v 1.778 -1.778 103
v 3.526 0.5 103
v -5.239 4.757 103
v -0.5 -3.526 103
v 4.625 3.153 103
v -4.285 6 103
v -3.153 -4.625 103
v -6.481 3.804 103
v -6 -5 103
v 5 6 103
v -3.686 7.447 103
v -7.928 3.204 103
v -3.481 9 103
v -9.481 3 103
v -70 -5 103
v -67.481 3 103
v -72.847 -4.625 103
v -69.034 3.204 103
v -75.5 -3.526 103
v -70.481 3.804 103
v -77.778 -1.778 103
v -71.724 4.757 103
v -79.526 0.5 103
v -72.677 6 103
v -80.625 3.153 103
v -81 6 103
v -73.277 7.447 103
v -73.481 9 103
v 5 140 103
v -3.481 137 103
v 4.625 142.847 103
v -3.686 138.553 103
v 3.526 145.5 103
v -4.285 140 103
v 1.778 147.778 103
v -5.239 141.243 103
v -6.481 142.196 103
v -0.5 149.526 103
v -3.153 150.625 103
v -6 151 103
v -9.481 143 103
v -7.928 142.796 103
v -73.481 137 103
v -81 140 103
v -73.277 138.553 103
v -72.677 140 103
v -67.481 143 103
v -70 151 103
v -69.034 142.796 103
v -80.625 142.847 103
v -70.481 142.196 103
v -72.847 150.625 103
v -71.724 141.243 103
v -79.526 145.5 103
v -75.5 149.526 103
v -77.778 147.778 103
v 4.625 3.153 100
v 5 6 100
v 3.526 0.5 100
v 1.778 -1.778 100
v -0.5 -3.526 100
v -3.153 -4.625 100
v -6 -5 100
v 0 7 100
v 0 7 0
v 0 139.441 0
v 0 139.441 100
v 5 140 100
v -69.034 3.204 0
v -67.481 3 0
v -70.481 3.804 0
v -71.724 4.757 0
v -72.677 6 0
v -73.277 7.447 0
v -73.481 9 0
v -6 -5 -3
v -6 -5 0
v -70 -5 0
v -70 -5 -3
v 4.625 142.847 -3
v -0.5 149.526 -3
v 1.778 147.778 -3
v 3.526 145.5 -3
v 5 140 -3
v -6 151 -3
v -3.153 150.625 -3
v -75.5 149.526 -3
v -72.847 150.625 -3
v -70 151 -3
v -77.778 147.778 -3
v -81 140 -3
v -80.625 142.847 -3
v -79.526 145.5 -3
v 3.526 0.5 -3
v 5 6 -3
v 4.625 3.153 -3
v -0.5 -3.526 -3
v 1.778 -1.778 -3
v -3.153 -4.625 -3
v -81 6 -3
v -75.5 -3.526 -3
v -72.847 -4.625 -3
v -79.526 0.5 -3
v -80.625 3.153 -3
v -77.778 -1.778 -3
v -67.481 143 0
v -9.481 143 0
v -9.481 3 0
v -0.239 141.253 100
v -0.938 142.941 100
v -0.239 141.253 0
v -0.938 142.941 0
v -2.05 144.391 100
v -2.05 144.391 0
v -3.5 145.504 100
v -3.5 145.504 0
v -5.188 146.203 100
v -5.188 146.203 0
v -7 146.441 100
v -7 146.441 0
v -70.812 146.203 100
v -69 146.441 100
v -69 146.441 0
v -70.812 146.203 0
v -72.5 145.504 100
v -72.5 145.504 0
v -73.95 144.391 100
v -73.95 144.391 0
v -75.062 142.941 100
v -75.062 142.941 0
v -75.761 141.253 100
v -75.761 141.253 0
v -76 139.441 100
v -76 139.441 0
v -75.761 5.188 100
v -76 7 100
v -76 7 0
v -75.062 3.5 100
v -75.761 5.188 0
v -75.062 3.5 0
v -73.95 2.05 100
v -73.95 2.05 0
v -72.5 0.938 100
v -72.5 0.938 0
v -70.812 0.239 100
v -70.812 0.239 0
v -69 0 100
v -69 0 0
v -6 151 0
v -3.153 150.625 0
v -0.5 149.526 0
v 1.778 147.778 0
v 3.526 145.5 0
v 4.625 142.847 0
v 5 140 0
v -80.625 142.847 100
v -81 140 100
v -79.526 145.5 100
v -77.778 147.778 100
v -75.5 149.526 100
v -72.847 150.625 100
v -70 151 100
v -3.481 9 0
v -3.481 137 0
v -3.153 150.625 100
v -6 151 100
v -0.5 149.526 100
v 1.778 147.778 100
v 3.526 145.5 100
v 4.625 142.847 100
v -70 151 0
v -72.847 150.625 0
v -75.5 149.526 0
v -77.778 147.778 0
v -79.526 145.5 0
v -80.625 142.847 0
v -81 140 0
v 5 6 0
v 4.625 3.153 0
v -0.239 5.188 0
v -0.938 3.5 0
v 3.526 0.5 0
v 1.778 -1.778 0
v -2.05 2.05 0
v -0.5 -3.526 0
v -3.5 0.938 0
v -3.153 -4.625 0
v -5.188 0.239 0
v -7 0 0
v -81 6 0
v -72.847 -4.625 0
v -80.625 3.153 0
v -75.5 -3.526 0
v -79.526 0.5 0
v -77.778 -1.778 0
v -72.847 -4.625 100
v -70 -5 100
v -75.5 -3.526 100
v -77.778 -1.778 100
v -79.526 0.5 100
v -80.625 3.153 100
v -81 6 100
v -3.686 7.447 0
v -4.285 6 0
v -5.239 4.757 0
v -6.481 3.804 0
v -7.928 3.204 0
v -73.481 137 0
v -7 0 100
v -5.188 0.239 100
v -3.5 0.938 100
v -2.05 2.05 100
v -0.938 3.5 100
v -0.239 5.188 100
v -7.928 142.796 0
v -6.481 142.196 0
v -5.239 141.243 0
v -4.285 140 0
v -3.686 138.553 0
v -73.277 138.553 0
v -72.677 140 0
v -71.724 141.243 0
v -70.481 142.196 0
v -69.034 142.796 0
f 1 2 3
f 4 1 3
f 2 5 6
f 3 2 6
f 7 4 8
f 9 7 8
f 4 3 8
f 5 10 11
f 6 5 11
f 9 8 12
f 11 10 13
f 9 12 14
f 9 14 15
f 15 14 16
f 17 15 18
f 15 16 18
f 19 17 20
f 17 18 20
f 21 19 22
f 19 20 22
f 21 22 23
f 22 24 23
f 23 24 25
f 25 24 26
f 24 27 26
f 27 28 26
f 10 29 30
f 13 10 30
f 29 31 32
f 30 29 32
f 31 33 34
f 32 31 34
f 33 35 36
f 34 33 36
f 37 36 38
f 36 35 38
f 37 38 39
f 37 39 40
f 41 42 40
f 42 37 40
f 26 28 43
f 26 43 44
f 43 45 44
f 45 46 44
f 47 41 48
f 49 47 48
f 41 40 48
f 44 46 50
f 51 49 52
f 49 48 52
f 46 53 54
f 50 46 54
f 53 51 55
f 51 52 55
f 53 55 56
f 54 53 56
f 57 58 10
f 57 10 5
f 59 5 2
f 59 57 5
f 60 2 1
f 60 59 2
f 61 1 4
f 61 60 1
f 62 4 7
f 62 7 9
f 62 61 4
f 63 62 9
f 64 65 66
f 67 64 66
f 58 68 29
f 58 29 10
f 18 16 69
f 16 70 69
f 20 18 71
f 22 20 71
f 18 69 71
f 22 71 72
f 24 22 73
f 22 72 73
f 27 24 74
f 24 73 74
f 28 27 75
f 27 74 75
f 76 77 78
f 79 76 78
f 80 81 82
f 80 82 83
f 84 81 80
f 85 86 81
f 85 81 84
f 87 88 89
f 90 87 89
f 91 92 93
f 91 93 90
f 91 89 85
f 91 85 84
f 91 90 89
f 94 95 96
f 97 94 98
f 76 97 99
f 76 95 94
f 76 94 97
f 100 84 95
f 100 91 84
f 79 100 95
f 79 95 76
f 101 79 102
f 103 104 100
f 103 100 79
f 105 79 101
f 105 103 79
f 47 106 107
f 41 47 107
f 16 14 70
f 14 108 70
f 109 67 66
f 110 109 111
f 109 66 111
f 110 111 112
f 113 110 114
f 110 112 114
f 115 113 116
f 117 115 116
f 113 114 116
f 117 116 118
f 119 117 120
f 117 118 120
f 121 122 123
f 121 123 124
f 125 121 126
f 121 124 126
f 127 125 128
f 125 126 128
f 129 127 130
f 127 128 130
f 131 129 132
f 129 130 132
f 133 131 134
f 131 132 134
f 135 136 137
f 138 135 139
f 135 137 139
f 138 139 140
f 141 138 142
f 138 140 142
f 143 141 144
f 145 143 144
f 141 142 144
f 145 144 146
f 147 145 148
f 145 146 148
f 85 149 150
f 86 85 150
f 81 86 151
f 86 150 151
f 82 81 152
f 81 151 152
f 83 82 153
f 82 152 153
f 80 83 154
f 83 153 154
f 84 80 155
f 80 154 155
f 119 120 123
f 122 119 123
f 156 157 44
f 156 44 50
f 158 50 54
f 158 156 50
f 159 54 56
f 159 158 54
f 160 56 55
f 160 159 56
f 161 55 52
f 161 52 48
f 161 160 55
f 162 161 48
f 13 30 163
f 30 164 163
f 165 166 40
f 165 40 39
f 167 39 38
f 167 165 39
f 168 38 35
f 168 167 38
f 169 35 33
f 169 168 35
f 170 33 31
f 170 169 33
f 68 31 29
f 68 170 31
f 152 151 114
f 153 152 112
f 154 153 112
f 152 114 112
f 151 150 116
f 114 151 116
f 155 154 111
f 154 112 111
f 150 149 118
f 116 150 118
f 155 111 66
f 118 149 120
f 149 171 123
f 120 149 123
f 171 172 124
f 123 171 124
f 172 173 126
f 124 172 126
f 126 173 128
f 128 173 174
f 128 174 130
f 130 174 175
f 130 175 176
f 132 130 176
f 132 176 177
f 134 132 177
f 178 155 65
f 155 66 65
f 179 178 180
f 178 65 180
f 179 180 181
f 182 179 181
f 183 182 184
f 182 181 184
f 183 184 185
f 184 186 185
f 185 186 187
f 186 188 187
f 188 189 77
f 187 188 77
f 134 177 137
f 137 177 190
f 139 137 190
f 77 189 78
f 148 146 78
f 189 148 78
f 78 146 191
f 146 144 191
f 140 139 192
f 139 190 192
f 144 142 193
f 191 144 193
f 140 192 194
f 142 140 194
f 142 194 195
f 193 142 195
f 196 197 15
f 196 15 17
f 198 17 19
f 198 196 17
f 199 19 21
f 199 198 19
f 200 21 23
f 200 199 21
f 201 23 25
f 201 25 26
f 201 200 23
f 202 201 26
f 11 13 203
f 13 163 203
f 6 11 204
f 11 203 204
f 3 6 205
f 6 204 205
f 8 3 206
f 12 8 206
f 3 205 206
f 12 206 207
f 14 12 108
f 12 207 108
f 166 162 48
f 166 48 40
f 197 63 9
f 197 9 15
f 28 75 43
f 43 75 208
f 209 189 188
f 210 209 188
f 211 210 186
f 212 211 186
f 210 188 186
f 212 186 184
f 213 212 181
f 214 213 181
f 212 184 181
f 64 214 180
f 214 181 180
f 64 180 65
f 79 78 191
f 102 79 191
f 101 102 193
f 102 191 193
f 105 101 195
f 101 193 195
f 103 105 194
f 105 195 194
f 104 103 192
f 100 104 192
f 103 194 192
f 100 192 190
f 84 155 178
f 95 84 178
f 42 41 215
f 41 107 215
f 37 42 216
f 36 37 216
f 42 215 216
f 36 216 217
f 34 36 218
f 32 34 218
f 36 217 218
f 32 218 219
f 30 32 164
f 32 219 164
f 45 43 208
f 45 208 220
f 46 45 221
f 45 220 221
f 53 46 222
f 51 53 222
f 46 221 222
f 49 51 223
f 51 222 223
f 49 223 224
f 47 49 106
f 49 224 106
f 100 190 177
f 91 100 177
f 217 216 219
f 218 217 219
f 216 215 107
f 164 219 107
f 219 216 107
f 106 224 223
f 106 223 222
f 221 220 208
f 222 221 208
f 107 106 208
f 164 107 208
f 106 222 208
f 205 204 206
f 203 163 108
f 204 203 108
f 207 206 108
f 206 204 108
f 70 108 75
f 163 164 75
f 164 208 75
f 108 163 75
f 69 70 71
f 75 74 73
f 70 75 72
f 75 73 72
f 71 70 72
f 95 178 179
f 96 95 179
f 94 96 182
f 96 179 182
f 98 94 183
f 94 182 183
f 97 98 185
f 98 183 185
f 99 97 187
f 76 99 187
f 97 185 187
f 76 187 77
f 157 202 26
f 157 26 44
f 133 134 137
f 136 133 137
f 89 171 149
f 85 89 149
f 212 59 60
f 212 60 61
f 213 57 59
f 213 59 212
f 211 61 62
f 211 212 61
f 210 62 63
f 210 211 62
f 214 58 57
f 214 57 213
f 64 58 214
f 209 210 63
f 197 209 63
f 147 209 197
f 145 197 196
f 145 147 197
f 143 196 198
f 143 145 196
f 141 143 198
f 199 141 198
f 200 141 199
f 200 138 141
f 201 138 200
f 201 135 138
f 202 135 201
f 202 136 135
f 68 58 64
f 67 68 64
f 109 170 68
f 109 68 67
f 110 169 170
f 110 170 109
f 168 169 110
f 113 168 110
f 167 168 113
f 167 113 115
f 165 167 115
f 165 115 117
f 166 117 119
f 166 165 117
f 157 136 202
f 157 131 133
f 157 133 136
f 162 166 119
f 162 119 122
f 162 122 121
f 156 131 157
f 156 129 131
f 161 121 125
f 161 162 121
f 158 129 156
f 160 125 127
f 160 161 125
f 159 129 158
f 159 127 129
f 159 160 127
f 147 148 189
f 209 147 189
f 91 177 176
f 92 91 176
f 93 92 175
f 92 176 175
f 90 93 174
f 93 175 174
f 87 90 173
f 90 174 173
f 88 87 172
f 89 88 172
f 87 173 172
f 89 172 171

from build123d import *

# Parameters (mm, degrees)
BOSS_EXTRUDE3_DEPTH = 100
BOSS_EXTRUDE4_DEPTH = 3
BOSS_EXTRUDE5_DEPTH = 3


with BuildPart() as part:
    # Sketch1 → Boss-Extrude3 (new body)
    with BuildSketch(Plane(origin=(0, 0, 0), x_dir=(0, 1, 0), z_dir=(0, 0, 1))):
        with BuildLine():
            Line((7, 0), (139.441461344, 0))
            ThreePointArc((139.441461344, 0), (144.391208812, 2.050252532), (146.441461344, 7))
            Line((146.441461344, 7), (146.441461344, 69))
            ThreePointArc((146.441461344, 69), (144.391208812, 73.949747468), (139.441461344, 76))
            Line((139.441461344, 76), (7, 76))
            ThreePointArc((7, 76), (2.050252532, 73.949747468), (0, 69))
            Line((0, 69), (0, 7))
            ThreePointArc((0, 7), (2.050252532, 2.050252532), (7, 0))
        make_face()
        with BuildLine():
            Line((3, 38), (3, 67.481223709))
            ThreePointArc((3, 67.481223709), (4.757359313, 71.723864396), (9, 73.481223709))
            Line((9, 73.481223709), (137, 73.481223709))
            ThreePointArc((137, 73.481223709), (141.242640687, 71.723864396), (143, 67.481223709))
            Line((143, 67.481223709), (143, 9.481223709))
            ThreePointArc((143, 9.481223709), (141.242640687, 5.238583022), (137, 3.481223709))
            Line((137, 3.481223709), (9, 3.481223709))
            ThreePointArc((9, 3.481223709), (4.757359313, 5.238583022), (3, 9.481223709))
            Line((3, 9.481223709), (3, 38))
        make_face(mode=Mode.SUBTRACT)
    extrude(amount=BOSS_EXTRUDE3_DEPTH)

    # Sketch1<5> → Boss-Extrude4 (add)
    with BuildSketch(Plane(origin=(0, 0, 0), x_dir=(0, 1, 0), z_dir=(0, 0, 1))):
        with BuildLine():
            Line((151, 38), (151, 6))
            ThreePointArc((151, 6), (147.778174593, -1.778174593), (140, -5))
            Line((140, -5), (6, -5))
            ThreePointArc((6, -5), (-1.778174593, -1.778174593), (-5, 6))
            Line((-5, 6), (-5, 70))
            ThreePointArc((-5, 70), (-1.778174593, 77.778174593), (6, 81))
            Line((6, 81), (73.220730672, 81))
            Line((73.220730672, 81), (140, 81))
            ThreePointArc((140, 81), (147.778174593, 77.778174593), (151, 70))
            Line((151, 70), (151, 38))
        make_face()
    extrude(amount=-BOSS_EXTRUDE4_DEPTH)

    # Sketch2 → Boss-Extrude5 (add)
    with BuildSketch(Plane.XY.offset(100)):
        with BuildLine():
            Line((-70, 151), (-6, 151))
            ThreePointArc((-6, 151), (1.778174593, 147.778174593), (5, 140))
            Line((5, 140), (5, 6))
            ThreePointArc((5, 6), (1.778174593, -1.778174593), (-6, -5))
            Line((-6, -5), (-70, -5))
            ThreePointArc((-70, -5), (-77.778174593, -1.778174593), (-81, 6))
            Line((-81, 6), (-81, 140))
            ThreePointArc((-81, 140), (-77.778174593, 147.778174593), (-70, 151))
        make_face()
        with BuildLine():
            Line((-67.481223709, 143), (-9.481223709, 143))
            ThreePointArc((-9.481223709, 143), (-5.238583022, 141.242640687), (-3.481223709, 137))
            Line((-3.481223709, 137), (-3.481223709, 9))
            ThreePointArc((-3.481223709, 9), (-5.238583022, 4.757359313), (-9.481223709, 3))
            Line((-9.481223709, 3), (-67.481223709, 3))
            ThreePointArc((-67.481223709, 3), (-71.723864396, 4.757359313), (-73.481223709, 9))
            Line((-73.481223709, 9), (-73.481223709, 137))
            ThreePointArc((-73.481223709, 137), (-71.723864396, 141.242640687), (-67.481223709, 143))
        make_face(mode=Mode.SUBTRACT)
    extrude(amount=BOSS_EXTRUDE5_DEPTH)


solid = part.part
